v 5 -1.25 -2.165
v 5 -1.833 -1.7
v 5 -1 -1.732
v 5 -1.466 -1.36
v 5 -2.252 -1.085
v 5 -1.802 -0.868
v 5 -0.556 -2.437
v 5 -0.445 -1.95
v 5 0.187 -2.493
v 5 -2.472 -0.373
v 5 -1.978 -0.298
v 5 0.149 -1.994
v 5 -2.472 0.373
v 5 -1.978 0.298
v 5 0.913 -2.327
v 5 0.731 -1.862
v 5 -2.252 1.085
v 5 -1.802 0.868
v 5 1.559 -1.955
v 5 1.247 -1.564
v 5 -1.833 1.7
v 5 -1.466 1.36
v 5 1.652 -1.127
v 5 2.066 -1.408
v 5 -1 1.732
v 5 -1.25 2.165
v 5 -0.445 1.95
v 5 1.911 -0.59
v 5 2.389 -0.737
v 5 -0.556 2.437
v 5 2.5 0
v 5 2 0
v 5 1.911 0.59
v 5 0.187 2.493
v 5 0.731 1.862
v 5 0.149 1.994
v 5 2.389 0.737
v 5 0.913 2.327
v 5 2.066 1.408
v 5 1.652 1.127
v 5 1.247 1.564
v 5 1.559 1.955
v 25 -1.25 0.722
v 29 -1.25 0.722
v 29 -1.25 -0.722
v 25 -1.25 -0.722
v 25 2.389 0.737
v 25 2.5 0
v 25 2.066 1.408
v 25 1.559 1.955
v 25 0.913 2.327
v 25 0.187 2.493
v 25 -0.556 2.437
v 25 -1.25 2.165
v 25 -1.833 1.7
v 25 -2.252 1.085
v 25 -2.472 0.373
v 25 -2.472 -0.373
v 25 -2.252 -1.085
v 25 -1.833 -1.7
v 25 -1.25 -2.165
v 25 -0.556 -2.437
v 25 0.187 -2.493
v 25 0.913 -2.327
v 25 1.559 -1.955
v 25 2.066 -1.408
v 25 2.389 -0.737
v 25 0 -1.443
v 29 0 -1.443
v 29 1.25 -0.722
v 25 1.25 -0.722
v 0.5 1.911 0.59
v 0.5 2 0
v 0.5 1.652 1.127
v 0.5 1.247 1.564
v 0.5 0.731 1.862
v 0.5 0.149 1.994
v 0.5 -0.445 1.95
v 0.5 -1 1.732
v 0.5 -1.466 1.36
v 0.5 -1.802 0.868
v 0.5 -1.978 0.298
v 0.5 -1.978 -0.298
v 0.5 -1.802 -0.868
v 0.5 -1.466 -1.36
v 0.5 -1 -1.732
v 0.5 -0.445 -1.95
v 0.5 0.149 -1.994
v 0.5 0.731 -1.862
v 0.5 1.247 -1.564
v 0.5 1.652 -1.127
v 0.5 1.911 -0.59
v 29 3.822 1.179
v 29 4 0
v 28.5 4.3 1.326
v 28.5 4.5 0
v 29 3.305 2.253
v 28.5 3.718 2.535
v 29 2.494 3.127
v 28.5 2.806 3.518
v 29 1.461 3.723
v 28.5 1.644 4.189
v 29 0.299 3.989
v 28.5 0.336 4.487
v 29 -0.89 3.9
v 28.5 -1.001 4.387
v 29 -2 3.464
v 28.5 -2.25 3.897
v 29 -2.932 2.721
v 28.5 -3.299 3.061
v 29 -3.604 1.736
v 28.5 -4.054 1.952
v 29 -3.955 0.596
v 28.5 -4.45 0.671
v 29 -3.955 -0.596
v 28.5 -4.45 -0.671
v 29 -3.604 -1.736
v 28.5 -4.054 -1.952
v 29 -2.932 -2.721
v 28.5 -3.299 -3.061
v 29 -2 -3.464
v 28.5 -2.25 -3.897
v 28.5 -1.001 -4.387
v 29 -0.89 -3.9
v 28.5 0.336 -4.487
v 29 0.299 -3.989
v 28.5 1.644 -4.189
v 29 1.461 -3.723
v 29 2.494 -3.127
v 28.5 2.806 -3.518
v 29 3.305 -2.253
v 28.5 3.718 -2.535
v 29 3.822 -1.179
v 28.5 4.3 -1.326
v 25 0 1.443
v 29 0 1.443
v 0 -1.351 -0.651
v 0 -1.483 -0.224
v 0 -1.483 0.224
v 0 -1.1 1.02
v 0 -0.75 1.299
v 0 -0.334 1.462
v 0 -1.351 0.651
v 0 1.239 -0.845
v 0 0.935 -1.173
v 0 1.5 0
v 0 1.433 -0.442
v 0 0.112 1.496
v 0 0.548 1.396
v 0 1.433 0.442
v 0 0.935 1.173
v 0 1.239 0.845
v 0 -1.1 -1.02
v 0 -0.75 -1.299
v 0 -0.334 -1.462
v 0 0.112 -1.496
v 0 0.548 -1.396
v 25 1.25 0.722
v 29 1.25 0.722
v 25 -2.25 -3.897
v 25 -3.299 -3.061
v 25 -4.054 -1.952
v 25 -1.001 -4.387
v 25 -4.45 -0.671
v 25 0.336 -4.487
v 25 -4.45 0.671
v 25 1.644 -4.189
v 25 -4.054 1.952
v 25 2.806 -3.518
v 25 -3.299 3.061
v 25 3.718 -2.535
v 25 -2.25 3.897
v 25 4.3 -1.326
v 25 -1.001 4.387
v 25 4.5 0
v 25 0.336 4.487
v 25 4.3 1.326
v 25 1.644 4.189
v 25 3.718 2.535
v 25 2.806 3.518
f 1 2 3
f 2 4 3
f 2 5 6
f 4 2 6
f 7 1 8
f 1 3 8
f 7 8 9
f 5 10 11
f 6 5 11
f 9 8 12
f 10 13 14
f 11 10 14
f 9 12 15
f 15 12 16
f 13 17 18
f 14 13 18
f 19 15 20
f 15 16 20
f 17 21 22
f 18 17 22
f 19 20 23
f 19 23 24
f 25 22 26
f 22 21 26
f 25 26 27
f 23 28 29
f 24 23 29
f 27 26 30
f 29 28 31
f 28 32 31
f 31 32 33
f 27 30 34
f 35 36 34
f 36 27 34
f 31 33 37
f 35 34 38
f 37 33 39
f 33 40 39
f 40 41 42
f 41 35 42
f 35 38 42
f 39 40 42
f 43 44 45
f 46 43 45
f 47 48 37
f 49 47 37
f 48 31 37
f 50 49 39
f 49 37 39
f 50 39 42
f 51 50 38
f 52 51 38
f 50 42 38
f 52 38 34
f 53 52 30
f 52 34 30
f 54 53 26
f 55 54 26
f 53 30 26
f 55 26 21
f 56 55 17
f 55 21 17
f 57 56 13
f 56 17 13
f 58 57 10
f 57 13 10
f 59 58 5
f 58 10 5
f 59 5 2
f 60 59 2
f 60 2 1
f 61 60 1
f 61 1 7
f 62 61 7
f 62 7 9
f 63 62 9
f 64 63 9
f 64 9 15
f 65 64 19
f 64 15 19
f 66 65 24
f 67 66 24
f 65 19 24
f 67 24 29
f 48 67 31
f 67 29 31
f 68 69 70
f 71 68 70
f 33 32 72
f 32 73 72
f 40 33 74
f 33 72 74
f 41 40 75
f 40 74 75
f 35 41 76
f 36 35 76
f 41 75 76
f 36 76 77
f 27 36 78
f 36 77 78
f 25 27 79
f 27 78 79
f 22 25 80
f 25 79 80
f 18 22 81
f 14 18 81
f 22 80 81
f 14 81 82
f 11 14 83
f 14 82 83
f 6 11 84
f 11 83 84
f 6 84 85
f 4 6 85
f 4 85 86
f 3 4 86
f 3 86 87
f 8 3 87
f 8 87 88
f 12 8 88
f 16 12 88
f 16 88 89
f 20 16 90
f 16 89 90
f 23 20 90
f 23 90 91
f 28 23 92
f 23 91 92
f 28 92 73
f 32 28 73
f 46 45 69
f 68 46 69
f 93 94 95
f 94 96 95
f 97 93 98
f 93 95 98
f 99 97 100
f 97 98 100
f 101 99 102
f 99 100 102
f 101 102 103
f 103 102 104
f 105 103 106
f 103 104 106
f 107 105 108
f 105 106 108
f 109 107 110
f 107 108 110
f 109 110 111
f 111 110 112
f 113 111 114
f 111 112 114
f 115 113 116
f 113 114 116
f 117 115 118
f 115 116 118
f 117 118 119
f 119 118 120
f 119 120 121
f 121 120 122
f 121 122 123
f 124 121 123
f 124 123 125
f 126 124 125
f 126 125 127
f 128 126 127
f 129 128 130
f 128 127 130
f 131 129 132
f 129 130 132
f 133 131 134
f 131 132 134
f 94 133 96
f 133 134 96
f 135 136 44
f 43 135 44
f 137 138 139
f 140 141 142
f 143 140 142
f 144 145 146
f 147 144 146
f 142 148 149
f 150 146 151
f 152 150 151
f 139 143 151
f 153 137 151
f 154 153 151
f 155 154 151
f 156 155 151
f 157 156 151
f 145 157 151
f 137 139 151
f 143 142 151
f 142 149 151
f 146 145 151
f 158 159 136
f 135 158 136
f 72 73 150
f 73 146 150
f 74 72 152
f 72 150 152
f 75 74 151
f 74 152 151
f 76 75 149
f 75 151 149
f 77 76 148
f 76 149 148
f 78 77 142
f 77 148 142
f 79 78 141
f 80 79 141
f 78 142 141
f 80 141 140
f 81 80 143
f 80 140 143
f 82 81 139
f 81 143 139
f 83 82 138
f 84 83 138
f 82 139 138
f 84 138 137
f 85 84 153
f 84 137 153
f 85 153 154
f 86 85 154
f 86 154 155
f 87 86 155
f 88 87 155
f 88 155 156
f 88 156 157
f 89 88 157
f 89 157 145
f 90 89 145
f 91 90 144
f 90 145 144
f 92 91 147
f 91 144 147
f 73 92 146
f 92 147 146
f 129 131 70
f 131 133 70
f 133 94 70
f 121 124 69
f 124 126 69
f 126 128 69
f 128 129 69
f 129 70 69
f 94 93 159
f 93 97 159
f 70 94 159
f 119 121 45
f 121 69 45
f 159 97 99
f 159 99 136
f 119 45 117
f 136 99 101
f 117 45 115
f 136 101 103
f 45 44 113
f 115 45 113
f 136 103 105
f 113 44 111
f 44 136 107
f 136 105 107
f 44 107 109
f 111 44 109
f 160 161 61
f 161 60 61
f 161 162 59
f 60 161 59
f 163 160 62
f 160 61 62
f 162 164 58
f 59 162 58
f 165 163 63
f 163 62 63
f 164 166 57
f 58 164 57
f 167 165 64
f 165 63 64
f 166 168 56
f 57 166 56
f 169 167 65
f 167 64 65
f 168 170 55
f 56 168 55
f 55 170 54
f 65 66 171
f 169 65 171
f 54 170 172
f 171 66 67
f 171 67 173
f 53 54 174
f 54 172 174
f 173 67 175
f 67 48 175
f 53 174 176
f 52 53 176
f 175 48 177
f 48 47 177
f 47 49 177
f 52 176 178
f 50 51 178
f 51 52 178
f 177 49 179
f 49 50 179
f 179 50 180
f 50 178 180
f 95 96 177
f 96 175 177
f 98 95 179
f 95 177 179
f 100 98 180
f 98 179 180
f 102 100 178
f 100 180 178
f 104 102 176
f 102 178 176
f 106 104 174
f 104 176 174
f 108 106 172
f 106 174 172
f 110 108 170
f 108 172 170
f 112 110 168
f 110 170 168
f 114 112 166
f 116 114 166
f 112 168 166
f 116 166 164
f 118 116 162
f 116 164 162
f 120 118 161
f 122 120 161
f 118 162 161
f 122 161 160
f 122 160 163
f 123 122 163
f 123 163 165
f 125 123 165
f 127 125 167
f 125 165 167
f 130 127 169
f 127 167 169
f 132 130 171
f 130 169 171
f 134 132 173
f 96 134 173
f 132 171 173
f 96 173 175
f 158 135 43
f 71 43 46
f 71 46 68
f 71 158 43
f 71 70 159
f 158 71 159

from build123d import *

# Parameters (mm, degrees)
CUT_EXTRUDE1_DEPTH = 4


with BuildPart() as part:
    # Sketch1 → Revolve1 (revolve)
    with BuildSketch(Plane.XY):
        Polygon((0, 0), (29, 0), (29, 4), (28.5, 4.5), (25, 4.5), (25, 2.5), (5, 2.5), (5, 2), (0.5, 2), (0, 1.5), align=None)
    revolve(axis=Axis((0, 0, 0), (1, 0, 0)))

    # Sketch2 → Cut-Extrude1 (cut)
    with BuildSketch(Plane(origin=(29, 0, 0), x_dir=(0, 0, -1), z_dir=(1, 0, 0))):
        Polygon((1.443375673, 0), (0.721687836, 1.25), (-0.721687836, 1.25), (-1.443375673, 0), (-0.721687836, -1.25), (0.721687836, -1.25), align=None)
    extrude(amount=-CUT_EXTRUDE1_DEPTH, mode=Mode.SUBTRACT)


solid = part.part
